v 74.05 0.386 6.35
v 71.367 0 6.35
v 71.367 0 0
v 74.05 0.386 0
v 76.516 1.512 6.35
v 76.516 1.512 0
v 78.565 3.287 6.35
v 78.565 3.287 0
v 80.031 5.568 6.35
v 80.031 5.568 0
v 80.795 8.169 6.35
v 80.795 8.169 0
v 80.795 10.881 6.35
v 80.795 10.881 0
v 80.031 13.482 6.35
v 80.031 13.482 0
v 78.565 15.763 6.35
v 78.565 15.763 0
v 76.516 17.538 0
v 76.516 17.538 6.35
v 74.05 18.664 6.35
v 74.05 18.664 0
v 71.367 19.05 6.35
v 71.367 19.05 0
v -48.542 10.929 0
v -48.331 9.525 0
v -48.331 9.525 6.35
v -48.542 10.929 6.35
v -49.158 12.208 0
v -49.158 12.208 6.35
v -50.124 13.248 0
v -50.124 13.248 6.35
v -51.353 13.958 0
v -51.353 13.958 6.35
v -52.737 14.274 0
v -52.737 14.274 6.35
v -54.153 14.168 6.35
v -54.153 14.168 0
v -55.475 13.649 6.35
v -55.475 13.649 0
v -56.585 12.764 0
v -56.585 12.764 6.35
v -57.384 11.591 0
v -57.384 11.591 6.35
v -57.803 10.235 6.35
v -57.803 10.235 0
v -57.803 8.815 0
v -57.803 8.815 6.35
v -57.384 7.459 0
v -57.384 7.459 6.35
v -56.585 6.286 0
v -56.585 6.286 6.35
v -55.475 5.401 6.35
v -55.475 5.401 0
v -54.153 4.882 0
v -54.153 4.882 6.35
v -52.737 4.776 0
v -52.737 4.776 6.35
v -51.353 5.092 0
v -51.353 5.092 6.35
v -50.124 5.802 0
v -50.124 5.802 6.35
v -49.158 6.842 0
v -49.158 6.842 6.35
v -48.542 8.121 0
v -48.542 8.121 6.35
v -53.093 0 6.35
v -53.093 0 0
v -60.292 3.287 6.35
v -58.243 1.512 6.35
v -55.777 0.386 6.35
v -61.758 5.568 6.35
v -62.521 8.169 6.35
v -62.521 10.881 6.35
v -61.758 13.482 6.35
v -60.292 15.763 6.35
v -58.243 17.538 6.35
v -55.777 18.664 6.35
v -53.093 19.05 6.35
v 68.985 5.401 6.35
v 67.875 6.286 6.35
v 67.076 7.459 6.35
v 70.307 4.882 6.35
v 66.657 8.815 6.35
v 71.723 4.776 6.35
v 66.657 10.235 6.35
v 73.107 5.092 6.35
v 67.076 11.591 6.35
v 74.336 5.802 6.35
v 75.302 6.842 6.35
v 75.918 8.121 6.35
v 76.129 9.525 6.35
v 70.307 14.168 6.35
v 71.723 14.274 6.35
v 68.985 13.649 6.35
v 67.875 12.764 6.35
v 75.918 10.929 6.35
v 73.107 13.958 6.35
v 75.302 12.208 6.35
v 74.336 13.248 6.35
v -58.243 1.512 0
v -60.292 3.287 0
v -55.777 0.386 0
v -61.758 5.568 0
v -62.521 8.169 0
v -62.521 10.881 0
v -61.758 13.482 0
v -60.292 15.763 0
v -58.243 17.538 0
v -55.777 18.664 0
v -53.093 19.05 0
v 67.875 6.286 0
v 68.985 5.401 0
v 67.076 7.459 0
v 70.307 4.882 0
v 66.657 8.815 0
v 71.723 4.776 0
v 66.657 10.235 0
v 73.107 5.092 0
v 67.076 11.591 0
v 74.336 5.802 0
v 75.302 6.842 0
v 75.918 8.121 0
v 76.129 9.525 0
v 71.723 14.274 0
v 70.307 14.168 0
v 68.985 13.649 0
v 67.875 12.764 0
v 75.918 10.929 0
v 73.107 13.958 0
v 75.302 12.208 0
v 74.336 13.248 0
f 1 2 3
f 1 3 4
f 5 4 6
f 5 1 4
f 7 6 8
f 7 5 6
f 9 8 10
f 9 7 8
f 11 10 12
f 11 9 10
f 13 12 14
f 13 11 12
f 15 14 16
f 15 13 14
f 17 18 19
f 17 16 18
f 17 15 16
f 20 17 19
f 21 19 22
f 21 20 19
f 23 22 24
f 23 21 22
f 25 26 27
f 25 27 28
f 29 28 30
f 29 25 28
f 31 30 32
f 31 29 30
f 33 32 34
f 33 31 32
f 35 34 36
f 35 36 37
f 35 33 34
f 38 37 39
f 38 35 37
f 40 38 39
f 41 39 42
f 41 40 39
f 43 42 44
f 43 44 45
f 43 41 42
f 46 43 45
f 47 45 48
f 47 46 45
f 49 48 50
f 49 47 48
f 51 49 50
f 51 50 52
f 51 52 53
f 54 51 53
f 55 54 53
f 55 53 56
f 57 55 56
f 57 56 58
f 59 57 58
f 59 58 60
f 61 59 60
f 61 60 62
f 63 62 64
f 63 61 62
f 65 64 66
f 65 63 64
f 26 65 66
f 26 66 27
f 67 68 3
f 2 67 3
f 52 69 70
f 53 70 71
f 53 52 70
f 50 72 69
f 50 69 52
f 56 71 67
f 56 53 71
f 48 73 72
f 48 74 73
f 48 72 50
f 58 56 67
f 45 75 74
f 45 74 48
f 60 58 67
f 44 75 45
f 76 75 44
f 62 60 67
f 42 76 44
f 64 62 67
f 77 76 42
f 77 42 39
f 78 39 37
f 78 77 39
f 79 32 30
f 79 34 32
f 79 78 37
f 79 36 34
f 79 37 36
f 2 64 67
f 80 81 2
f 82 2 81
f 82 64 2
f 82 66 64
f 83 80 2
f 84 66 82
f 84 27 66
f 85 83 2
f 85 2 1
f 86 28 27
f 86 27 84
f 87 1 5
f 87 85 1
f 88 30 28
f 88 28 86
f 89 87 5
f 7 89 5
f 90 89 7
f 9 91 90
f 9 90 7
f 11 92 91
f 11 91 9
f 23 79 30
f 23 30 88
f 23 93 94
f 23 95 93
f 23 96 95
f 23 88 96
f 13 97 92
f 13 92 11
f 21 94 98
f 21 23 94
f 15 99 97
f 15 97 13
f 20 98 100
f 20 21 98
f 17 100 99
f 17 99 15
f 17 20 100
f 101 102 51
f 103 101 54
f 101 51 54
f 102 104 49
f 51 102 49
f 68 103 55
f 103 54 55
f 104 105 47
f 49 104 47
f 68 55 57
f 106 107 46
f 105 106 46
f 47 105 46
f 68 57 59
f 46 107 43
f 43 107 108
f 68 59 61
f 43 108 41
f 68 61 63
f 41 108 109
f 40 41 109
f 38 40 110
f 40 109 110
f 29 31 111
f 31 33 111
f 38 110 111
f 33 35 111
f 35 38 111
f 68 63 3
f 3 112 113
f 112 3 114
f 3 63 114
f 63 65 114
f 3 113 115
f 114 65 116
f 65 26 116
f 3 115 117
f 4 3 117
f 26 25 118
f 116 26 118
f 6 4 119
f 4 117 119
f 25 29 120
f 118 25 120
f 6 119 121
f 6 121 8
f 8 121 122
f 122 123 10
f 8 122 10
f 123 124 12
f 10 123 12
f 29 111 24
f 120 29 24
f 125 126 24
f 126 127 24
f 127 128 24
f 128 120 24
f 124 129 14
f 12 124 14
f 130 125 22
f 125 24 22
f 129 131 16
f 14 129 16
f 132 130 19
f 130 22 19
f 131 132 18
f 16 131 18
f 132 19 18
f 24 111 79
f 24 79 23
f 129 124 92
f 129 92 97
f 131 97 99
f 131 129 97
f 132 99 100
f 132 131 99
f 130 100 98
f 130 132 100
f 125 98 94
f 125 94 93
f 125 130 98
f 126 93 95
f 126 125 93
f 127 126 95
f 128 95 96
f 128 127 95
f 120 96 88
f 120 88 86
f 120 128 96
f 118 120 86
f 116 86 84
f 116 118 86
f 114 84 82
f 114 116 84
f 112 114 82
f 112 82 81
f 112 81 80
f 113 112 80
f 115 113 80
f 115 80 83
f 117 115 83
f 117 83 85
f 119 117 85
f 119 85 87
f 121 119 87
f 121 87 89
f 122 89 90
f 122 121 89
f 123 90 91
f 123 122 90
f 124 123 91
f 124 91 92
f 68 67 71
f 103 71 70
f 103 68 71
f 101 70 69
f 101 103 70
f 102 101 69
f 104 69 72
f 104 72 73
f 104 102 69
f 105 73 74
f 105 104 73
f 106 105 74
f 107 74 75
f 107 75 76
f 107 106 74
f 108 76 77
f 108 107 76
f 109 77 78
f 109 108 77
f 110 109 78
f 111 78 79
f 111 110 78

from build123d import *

# Parameters (mm, degrees)
SKETCH1_W           = 143.51
SKETCH1_H           = 19.05
BOSS_EXTRUDE1_DEPTH = 6.35
SKETCH3_R           = 4.7625
CUT_EXTRUDE1_DEPTH  = 6.35
FILLET5_RADIUS      = 9.525
FILLET5_LENGTH      = 6.35
FILLET6_RADIUS      = 9.525
FILLET6_LENGTH      = 6.35


with BuildPart() as part:
    # Sketch1 → Boss-Extrude1 (new body)
    with BuildSketch(Plane.XY):
        with Locations((9.136619712, 9.525)):
            Rectangle(SKETCH1_W, SKETCH1_H)
    extrude(amount=BOSS_EXTRUDE1_DEPTH)

    # Sketch3 → Cut-Extrude1 (cut)
    with BuildSketch(Plane.XY):
        with Locations((-53.093380288, 9.525)):
            Circle(SKETCH3_R)
        with Locations((71.366619712, 9.525)):
            Circle(SKETCH3_R)
    extrude(amount=CUT_EXTRUDE1_DEPTH, mode=Mode.SUBTRACT)

    # Fillet5: full round fillet: the end face becomes a half cylinder, R = half its width
    fillet5_face = Plane((-62.618380288, 9.525, 3.175), x_dir=(0, 0, -1), z_dir=(-1, 0, 0))  # on the end face: x along it, z out of the body
    fillet5_slab = fillet5_face.offset(-FILLET5_RADIUS / 2) * Box(FILLET5_LENGTH, 2 * FILLET5_RADIUS, FILLET5_RADIUS, mode=Mode.PRIVATE)  # the body's end, R deep
    fillet5_round = Plane((-53.093380288, 9.525, 3.175), x_dir=(-1, 0, 0), z_dir=(0, 0, -1)) * Cylinder(FILLET5_RADIUS, FILLET5_LENGTH, mode=Mode.PRIVATE)  # its axis R under the face
    add(fillet5_slab - fillet5_round, mode=Mode.SUBTRACT)

    # Fillet6: full round fillet: the end face becomes a half cylinder, R = half its width
    fillet6_face = Plane((80.891619712, 9.525, 3.175), x_dir=(0, 0, 1), z_dir=(1, 0, 0))  # on the end face: x along it, z out of the body
    fillet6_slab = fillet6_face.offset(-FILLET6_RADIUS / 2) * Box(FILLET6_LENGTH, 2 * FILLET6_RADIUS, FILLET6_RADIUS, mode=Mode.PRIVATE)  # the body's end, R deep
    fillet6_round = Plane((71.366619712, 9.525, 3.175), x_dir=(1, 0, 0), z_dir=(0, 0, 1)) * Cylinder(FILLET6_RADIUS, FILLET6_LENGTH, mode=Mode.PRIVATE)  # its axis R under the face
    add(fillet6_slab - fillet6_round, mode=Mode.SUBTRACT)


solid = part.part
